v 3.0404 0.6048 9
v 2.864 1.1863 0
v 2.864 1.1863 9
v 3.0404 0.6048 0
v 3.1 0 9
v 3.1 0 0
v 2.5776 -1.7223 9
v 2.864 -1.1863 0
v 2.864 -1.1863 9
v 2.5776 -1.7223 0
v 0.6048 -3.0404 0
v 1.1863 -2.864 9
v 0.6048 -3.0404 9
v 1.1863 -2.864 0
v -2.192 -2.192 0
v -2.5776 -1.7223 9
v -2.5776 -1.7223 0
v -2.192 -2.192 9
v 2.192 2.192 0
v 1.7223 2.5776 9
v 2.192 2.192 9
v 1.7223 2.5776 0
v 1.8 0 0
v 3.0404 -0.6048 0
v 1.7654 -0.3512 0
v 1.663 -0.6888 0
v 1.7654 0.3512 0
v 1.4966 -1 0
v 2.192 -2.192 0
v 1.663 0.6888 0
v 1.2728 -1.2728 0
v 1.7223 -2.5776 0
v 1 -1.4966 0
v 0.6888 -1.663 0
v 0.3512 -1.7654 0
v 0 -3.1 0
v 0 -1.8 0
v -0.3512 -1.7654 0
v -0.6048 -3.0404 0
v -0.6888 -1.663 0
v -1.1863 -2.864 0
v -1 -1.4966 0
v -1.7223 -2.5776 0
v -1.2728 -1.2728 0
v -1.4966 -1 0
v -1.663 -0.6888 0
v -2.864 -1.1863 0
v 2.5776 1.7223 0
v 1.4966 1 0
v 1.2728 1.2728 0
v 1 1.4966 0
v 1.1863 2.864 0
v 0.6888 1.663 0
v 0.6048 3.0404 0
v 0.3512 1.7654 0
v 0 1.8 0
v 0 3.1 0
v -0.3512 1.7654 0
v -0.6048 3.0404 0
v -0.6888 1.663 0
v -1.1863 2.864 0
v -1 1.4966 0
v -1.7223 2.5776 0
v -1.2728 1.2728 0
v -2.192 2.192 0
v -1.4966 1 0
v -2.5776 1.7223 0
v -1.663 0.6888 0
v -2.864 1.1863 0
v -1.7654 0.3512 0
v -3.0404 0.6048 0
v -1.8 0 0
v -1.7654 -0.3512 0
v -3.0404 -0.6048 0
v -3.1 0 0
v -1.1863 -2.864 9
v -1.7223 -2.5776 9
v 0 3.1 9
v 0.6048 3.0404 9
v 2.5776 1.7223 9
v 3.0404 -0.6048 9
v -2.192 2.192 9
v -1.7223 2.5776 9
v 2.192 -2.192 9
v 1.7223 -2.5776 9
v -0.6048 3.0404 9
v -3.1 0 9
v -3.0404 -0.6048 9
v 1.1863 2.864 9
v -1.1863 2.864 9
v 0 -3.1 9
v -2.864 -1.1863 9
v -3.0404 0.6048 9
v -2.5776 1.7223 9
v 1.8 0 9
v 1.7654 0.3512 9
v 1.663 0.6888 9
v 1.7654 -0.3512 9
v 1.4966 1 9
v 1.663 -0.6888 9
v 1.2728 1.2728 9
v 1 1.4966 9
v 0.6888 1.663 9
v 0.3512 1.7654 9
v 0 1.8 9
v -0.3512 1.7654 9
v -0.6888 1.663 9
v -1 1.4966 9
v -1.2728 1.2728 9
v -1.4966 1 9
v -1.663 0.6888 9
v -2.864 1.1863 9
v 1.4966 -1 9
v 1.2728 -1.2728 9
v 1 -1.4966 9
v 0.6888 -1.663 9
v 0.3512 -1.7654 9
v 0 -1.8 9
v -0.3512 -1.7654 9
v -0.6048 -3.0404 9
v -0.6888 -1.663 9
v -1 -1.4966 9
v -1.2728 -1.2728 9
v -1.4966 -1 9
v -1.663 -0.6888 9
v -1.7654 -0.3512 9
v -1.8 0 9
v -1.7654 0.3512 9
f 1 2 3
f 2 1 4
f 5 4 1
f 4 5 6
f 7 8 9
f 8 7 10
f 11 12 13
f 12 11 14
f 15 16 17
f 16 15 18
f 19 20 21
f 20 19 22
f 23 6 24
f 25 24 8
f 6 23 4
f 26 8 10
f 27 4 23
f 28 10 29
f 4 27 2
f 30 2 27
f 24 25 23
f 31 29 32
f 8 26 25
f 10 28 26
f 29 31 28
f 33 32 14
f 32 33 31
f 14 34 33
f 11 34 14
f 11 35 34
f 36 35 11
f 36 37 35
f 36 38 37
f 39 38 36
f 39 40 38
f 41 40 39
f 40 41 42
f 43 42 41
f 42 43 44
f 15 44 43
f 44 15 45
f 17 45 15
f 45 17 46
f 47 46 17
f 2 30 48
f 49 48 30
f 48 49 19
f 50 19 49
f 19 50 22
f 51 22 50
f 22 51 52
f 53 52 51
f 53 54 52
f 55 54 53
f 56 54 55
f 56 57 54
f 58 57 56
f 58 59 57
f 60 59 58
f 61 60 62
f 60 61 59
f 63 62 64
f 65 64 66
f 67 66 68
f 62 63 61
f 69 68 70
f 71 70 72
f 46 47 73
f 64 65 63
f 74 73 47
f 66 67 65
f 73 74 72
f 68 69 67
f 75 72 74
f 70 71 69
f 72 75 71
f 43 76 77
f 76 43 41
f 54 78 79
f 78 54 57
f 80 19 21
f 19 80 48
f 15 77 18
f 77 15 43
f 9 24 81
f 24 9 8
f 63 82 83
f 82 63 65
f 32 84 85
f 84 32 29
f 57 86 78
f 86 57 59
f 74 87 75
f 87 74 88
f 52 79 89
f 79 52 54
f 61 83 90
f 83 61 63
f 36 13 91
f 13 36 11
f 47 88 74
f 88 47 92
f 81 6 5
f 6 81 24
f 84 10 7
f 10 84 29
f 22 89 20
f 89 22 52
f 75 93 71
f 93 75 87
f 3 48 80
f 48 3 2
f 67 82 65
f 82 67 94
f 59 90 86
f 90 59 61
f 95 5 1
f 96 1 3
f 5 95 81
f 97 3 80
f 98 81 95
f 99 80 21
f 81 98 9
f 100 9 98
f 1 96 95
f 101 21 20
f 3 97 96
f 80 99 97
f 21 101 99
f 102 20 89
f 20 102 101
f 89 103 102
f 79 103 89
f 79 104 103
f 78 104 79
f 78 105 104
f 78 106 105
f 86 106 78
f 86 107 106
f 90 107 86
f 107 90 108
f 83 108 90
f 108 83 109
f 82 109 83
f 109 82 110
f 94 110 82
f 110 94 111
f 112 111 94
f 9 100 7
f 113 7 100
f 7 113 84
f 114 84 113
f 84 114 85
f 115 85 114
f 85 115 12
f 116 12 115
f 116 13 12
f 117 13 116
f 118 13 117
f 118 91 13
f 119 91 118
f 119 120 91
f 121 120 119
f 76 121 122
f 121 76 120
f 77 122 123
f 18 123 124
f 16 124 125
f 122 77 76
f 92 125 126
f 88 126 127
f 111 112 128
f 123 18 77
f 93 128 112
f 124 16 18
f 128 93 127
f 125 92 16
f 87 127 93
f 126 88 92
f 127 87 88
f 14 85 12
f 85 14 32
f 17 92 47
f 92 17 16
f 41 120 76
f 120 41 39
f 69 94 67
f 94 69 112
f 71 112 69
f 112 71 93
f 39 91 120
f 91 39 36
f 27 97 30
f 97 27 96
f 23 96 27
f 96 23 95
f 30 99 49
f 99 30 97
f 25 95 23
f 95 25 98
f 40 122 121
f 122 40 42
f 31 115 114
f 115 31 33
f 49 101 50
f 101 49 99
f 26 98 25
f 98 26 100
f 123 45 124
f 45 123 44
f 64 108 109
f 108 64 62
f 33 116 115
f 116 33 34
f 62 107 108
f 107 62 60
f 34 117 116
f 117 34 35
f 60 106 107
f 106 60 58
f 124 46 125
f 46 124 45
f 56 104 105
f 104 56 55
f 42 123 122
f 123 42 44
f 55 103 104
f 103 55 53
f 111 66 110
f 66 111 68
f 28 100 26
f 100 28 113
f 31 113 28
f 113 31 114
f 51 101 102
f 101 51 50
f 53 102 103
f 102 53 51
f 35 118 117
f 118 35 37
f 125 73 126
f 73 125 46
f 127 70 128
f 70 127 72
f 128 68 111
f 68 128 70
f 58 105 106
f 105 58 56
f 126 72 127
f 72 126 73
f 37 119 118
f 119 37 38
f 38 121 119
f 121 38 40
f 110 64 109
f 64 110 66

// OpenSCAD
height = 10 - 1;
inner_radius = 1.8;
outer_radius = 3.1;

difference() {
    cylinder(height, outer_radius, outer_radius, $fn=32);
    translate([0, 0, -1]) cylinder(height + 2, inner_radius, inner_radius, $fn=32);
}
